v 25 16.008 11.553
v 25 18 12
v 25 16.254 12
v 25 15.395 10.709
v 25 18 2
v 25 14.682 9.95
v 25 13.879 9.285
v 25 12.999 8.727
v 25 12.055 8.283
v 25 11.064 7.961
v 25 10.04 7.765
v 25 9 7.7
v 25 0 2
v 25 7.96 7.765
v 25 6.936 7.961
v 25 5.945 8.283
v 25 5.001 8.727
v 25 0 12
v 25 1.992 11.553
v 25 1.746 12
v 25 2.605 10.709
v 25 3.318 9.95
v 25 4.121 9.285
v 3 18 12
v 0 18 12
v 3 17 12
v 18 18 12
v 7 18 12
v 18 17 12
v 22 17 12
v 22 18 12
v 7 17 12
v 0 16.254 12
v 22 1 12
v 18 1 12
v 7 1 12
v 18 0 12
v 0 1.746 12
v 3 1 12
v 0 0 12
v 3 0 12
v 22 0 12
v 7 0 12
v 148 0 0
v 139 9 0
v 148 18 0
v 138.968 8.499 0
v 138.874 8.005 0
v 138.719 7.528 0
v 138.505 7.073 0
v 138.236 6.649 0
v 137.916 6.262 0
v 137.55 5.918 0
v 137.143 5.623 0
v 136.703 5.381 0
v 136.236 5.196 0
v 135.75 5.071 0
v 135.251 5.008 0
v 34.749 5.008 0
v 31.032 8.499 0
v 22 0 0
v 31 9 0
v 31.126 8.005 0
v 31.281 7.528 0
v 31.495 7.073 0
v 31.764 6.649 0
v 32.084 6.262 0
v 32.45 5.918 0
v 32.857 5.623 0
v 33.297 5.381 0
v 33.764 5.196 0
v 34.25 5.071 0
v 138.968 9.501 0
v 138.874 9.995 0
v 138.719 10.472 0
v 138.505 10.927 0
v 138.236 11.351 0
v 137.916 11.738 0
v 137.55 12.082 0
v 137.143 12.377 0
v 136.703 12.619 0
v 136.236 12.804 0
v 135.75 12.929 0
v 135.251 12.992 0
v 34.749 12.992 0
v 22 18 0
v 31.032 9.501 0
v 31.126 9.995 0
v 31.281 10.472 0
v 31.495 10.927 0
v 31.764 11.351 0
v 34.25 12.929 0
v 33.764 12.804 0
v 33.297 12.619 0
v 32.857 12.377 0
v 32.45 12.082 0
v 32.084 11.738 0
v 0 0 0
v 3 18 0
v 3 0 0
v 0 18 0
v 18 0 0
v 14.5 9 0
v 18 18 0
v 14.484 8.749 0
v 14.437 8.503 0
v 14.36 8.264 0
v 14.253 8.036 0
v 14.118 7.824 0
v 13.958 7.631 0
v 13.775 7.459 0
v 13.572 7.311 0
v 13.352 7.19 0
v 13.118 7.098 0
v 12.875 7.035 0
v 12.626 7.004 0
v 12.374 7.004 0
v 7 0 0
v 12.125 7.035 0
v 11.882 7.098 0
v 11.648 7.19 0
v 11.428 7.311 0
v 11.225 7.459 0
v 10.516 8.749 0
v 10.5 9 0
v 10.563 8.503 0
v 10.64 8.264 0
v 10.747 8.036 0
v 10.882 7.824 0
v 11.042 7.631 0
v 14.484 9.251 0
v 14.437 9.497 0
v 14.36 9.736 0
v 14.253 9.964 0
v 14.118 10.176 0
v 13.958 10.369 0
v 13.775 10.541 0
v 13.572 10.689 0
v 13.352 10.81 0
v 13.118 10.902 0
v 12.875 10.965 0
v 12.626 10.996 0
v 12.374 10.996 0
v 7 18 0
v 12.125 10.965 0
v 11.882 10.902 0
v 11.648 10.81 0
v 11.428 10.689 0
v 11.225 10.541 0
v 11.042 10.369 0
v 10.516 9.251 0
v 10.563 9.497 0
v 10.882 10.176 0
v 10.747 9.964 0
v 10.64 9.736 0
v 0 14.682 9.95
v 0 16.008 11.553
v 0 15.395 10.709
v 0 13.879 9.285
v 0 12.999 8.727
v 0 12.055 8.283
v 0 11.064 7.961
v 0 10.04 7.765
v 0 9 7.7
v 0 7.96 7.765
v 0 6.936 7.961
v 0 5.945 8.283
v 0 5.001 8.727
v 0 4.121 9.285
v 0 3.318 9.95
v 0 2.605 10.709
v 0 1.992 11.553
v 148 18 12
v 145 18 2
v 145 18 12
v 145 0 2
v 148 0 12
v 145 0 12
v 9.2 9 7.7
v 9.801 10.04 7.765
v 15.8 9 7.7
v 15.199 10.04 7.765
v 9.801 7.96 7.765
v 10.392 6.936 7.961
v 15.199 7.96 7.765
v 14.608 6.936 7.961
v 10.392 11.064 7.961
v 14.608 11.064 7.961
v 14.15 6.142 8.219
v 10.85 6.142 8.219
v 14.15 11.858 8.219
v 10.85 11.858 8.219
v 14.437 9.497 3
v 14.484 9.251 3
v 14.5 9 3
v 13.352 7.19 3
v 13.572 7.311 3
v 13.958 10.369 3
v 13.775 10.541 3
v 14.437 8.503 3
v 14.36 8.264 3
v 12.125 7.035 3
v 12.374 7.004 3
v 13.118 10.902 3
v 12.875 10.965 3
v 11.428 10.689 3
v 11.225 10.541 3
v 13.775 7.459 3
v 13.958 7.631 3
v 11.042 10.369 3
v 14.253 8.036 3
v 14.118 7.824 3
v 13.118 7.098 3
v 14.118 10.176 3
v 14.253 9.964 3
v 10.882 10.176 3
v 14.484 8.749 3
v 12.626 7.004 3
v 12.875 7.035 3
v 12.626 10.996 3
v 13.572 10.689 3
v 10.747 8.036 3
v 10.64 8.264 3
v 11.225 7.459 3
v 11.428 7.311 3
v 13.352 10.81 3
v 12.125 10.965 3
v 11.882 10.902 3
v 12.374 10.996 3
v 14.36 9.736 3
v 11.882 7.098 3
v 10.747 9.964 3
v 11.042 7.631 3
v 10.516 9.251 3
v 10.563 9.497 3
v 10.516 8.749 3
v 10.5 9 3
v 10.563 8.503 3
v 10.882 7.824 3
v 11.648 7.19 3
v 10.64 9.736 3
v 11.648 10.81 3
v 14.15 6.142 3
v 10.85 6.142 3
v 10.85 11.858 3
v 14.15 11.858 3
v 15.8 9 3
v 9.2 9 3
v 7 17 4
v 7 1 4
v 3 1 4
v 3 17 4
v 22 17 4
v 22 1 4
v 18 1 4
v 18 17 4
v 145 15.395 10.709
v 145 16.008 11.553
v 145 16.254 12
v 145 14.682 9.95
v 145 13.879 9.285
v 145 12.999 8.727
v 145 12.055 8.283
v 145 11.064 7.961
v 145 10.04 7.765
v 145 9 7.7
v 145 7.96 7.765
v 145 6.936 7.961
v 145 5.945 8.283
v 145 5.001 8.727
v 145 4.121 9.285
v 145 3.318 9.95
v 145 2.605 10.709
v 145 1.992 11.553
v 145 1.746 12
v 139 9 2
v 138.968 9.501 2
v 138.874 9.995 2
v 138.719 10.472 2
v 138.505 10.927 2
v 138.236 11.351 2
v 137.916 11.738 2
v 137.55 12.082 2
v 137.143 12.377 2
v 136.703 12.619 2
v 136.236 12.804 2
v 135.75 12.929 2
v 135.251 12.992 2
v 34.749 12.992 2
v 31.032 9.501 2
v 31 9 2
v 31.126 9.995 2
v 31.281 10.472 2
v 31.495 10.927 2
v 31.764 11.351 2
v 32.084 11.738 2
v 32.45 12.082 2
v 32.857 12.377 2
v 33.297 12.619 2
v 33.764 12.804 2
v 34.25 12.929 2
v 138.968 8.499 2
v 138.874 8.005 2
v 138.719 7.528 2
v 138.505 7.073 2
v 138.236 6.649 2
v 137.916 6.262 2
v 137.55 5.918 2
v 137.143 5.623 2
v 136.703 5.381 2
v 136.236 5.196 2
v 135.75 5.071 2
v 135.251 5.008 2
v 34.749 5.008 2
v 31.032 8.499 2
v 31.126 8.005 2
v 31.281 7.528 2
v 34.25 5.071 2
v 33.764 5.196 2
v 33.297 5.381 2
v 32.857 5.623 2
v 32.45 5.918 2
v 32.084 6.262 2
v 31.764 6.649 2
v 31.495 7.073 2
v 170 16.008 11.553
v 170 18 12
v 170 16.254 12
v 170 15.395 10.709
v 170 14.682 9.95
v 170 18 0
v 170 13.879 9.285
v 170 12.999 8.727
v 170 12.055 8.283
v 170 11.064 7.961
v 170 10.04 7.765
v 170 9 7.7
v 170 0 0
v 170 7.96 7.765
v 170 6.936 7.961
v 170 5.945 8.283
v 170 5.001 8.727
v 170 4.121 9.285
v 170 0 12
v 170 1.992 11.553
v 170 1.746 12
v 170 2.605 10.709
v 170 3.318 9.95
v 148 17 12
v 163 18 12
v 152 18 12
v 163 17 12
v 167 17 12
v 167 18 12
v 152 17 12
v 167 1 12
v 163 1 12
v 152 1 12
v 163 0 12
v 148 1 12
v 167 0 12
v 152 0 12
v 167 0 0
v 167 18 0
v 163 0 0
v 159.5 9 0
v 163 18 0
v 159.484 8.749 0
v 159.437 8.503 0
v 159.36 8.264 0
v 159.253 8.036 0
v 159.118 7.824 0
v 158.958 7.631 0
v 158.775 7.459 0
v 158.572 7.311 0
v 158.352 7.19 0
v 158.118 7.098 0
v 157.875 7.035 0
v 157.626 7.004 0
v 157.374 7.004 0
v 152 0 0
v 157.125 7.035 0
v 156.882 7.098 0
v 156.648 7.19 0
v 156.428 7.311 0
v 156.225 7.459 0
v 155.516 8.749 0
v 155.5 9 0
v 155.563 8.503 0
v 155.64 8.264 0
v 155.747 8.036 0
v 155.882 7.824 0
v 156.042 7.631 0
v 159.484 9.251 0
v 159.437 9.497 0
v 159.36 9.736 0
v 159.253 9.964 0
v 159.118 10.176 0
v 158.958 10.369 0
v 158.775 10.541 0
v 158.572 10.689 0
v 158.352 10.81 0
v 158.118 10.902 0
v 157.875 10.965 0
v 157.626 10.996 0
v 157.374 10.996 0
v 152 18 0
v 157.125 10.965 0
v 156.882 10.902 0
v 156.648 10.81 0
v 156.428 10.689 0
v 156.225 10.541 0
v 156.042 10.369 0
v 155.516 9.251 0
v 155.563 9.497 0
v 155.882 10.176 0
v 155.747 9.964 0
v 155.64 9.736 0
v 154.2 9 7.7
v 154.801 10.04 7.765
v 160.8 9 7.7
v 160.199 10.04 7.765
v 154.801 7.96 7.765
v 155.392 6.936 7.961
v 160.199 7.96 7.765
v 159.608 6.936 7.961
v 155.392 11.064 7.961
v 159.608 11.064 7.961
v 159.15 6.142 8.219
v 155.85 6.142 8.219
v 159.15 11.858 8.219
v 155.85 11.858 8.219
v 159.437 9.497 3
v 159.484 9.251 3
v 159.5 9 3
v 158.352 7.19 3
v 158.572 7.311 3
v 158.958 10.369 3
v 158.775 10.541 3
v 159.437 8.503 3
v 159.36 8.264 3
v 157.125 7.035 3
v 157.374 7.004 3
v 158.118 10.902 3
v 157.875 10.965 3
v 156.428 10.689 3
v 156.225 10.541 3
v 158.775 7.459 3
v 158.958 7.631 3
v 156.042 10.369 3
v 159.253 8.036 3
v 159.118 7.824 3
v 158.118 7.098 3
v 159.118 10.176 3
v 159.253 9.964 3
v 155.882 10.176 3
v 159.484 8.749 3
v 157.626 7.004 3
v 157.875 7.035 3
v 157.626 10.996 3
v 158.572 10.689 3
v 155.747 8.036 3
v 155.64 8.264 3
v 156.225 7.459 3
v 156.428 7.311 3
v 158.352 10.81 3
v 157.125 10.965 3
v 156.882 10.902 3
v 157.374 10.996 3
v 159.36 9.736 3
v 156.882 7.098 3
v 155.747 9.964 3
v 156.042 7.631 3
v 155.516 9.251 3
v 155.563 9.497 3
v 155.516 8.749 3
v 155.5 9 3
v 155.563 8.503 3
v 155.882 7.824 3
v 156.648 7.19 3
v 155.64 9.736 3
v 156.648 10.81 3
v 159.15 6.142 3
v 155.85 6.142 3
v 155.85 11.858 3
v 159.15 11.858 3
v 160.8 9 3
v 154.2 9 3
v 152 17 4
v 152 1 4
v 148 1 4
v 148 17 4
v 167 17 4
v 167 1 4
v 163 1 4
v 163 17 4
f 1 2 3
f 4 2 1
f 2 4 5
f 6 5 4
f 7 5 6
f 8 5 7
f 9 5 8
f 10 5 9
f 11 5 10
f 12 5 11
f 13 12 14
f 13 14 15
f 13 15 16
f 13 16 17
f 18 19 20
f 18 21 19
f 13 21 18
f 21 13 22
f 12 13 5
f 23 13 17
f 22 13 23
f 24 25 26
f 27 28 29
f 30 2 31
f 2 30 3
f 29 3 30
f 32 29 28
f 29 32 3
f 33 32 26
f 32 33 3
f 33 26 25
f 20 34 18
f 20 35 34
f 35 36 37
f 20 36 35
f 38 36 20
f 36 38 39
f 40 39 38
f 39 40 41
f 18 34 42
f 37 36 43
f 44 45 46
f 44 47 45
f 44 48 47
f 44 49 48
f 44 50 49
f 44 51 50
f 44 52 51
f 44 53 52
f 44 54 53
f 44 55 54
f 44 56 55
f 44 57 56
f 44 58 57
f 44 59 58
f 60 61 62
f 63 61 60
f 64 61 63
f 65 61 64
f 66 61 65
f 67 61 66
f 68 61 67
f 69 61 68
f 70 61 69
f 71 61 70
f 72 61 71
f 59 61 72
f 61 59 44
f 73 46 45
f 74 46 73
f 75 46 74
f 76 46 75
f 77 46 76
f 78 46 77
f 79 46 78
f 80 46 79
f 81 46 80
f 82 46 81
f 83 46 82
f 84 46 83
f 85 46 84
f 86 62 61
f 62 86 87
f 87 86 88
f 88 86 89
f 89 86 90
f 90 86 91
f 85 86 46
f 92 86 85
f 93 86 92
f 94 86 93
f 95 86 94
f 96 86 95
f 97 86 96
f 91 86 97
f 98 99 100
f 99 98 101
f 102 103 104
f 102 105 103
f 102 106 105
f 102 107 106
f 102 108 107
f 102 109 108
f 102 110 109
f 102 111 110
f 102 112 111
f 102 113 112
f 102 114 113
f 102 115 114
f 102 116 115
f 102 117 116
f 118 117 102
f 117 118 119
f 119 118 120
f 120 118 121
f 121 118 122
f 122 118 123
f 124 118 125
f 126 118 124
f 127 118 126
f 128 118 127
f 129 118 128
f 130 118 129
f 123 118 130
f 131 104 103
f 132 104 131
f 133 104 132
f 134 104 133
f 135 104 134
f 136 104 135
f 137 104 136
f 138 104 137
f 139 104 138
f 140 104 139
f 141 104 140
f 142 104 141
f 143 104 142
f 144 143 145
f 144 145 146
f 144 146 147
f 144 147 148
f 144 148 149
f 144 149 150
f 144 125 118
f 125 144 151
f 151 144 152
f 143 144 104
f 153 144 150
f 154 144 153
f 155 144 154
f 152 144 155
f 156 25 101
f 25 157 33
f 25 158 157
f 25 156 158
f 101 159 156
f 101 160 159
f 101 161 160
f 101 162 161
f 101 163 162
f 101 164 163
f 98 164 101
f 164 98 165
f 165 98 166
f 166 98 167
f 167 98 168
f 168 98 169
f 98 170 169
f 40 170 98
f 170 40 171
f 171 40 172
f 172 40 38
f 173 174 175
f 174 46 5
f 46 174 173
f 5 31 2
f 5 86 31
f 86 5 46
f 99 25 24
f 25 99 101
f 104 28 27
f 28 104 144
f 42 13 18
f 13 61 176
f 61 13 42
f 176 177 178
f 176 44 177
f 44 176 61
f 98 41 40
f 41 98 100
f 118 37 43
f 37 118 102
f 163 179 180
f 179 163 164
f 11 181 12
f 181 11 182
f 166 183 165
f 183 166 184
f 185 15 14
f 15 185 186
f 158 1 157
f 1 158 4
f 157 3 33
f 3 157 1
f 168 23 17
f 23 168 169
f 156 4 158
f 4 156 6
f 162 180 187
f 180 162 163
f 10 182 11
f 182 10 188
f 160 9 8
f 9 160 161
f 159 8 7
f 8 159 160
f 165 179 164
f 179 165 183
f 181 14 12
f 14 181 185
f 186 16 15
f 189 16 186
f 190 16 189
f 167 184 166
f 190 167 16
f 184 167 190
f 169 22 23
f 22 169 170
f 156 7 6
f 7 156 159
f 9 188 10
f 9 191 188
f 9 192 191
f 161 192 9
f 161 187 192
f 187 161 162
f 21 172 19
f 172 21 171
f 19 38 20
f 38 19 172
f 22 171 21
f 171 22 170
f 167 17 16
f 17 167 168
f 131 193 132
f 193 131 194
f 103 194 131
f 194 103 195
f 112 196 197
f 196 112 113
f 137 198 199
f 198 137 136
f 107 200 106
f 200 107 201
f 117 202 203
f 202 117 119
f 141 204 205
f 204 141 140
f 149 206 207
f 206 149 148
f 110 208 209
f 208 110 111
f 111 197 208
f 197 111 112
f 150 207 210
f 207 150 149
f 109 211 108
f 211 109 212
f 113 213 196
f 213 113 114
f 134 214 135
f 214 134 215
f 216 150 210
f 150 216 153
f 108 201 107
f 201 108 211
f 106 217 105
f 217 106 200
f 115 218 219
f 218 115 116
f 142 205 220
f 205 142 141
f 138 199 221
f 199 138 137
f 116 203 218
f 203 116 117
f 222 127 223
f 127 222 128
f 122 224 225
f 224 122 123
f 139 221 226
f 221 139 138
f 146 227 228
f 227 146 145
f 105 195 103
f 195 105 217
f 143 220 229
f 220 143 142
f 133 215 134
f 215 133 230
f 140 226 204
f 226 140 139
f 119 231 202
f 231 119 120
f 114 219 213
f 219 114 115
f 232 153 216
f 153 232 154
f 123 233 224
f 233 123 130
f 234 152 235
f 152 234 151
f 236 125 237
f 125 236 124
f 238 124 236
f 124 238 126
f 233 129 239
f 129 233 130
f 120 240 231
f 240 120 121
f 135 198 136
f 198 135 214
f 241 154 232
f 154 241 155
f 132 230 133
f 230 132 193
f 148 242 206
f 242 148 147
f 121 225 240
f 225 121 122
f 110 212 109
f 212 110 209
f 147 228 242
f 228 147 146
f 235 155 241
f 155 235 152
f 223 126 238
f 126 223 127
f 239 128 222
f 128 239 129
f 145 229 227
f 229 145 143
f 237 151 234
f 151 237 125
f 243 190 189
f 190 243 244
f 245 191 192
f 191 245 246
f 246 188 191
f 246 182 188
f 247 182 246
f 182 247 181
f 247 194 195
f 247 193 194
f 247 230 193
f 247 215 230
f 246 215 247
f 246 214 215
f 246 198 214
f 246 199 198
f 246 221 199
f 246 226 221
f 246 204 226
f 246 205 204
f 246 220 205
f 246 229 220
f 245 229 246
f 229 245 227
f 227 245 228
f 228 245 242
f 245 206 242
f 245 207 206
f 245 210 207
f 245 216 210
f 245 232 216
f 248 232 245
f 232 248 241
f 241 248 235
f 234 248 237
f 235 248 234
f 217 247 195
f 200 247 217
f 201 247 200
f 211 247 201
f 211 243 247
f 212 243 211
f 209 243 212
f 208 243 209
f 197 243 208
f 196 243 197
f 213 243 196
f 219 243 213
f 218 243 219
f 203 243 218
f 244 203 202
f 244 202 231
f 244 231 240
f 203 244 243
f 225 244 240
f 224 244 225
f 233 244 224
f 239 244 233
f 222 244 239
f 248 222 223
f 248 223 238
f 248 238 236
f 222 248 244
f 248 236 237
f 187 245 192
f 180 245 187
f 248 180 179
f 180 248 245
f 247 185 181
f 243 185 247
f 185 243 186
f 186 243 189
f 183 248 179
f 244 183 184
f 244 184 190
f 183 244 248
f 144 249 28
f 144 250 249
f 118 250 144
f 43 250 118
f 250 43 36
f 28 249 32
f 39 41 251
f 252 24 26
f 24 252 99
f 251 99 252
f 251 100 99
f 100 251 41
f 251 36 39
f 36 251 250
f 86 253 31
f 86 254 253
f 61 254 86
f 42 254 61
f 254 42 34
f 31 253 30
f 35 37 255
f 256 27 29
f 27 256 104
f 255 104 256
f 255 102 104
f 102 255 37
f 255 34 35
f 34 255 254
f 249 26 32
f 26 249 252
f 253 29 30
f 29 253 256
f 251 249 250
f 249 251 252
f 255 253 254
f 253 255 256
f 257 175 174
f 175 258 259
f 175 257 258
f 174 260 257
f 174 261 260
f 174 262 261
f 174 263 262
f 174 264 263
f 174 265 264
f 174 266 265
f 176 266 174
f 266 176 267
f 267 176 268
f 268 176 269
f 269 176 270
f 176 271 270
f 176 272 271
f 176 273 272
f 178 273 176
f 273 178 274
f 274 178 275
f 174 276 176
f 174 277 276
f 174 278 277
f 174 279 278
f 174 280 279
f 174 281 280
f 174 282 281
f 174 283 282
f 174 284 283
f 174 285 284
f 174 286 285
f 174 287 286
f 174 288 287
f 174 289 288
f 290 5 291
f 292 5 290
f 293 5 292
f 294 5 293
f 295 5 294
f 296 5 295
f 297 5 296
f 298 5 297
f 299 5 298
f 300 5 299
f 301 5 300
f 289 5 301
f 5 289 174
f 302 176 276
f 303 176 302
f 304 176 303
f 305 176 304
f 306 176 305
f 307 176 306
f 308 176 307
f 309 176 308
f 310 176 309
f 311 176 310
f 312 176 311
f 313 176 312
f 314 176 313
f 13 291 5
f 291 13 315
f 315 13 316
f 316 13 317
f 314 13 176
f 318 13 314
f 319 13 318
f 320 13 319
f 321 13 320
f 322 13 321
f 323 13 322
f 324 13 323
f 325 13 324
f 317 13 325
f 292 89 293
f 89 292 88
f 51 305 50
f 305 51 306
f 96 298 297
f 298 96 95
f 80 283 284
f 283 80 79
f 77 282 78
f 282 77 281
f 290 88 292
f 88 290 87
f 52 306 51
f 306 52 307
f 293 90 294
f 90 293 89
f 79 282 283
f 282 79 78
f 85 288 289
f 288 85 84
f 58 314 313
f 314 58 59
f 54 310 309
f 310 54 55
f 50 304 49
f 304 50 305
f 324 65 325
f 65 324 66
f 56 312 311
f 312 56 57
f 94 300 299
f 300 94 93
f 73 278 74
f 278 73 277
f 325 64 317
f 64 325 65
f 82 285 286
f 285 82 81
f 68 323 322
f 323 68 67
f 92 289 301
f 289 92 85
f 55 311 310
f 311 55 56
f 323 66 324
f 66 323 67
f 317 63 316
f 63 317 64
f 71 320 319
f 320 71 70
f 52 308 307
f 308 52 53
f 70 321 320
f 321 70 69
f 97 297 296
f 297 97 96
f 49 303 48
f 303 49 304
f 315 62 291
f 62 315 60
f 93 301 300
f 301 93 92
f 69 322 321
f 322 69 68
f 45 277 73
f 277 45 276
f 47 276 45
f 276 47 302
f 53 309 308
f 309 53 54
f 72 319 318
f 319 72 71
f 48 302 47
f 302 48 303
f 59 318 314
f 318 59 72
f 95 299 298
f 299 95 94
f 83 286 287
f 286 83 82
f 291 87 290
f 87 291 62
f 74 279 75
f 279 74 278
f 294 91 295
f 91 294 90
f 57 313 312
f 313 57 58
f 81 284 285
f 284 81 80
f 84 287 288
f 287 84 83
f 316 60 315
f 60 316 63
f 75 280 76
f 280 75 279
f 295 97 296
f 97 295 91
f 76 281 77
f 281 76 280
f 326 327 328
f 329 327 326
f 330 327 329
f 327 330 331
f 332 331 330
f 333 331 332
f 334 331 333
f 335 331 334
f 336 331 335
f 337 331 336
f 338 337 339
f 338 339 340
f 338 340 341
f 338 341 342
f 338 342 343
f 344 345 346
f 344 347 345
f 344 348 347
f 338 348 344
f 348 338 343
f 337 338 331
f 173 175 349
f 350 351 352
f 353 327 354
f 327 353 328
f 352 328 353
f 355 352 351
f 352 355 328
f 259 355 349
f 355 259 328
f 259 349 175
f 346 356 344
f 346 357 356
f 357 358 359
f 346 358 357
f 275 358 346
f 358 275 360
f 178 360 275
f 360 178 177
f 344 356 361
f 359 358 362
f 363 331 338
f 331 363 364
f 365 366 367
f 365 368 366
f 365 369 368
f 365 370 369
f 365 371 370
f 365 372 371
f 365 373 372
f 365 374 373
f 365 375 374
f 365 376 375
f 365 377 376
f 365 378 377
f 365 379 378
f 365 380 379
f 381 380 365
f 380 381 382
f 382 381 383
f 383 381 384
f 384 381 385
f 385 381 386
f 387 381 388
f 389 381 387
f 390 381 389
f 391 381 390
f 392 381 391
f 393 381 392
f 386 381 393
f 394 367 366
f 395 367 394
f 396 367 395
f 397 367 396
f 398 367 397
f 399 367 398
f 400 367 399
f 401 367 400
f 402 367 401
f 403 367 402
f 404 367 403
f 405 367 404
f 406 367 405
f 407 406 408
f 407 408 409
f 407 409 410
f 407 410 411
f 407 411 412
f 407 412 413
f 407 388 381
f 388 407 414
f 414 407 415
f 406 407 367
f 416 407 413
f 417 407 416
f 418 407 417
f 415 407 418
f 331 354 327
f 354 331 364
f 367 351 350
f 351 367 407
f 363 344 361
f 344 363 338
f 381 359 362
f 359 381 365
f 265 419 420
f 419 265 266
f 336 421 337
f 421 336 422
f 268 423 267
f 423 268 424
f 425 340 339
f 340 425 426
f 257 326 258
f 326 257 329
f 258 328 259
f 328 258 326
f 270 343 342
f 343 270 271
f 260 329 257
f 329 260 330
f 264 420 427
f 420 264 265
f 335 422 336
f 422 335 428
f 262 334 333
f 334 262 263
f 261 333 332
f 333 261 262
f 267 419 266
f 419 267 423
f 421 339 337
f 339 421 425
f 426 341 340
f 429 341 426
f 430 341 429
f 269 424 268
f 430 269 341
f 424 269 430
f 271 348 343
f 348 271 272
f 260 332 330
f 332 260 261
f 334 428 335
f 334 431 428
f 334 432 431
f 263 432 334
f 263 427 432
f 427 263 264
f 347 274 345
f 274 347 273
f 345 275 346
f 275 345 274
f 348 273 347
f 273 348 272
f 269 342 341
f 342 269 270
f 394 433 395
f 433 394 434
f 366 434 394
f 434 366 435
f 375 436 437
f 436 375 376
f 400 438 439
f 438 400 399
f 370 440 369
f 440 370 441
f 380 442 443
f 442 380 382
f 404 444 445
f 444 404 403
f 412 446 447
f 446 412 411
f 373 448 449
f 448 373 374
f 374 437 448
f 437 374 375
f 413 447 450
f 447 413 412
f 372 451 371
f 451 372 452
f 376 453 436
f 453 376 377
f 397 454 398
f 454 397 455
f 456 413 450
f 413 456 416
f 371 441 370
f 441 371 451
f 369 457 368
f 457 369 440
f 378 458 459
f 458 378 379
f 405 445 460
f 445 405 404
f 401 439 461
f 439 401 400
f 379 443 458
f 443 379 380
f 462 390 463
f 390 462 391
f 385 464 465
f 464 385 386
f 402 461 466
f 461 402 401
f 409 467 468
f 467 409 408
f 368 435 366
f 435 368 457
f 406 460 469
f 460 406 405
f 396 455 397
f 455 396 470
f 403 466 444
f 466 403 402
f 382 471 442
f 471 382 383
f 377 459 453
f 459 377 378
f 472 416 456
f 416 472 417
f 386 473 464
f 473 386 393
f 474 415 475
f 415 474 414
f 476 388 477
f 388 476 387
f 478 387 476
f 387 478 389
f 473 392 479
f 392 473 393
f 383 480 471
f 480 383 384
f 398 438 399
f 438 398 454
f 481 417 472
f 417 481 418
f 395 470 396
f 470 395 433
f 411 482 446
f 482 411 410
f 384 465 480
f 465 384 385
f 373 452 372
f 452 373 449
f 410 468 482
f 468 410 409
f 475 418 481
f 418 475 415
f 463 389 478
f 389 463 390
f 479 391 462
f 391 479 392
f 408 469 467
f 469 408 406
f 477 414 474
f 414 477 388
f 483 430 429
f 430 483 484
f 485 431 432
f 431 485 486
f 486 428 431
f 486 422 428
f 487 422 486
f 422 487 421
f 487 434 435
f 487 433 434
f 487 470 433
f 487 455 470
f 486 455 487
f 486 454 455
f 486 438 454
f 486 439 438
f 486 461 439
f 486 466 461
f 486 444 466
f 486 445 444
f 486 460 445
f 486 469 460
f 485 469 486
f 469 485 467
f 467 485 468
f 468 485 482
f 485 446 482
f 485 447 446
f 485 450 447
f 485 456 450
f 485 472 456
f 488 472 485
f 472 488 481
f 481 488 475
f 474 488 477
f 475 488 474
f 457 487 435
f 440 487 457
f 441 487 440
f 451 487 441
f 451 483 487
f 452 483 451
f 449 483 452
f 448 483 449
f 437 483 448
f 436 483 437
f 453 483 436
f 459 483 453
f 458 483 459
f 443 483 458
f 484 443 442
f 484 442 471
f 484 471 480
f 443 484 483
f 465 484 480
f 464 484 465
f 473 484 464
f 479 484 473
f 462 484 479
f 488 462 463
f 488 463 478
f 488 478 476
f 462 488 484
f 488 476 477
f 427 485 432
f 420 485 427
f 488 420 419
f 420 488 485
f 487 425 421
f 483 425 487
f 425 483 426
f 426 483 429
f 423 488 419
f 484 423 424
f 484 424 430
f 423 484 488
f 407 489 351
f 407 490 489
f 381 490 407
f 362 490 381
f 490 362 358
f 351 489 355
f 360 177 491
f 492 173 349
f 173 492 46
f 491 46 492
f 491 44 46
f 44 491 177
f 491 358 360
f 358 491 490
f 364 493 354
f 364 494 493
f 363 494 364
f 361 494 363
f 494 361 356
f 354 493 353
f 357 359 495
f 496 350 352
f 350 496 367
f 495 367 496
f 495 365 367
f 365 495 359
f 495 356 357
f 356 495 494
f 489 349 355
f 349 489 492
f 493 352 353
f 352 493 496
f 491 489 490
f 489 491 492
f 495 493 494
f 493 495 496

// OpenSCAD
ep=2;
r_douille=8.3;
largeur=18;
h1=12;
h2=16;
l_fixe=25;
l_flottant=31;
trou_m3=2;
ecrou_m3=3.3;
pass_collier=4;
ep_collier=1;
entraxe=145;

module support_douille_fixe(){
	difference(){
		cube([l_fixe,largeur,h1]);

		//trou pour douille
		translate([-5,largeur/2,h2]){rotate([0,90,0])cylinder(h=l_fixe+10, r=r_douille, $fn=50);}

		//trous pour écrou de fixation
		translate([l_fixe/2,largeur/2,-5]){cylinder(h=h2+10, r=trou_m3, $fn=50);}
		translate([l_fixe/2,largeur/2,3]){cylinder(h=h2+10, r=ecrou_m3, $fn=6);}

		//creux pour passage collier
		translate([3,-2,-5]){cube([pass_collier,ep_collier+2,h2+10]);}
		translate([18,-2,-5]){cube([pass_collier,ep_collier+2,h2+10]);}
		translate([3,largeur-ep_collier,-5]){cube([pass_collier,ep_collier+2,h2+10]);}
		translate([18,largeur-ep_collier,-5]){cube([pass_collier,ep_collier+2,h2+10]);}
		translate([3,-5,-2]){cube([pass_collier,largeur+10,pass_collier+2]);}
		translate([18,-5,-2]){cube([pass_collier,largeur+10,pass_collier+2]);}
		
	}
}

module support_douille_flottant(){
}

module lamelle_assemblage(){
	difference(){
		cube([entraxe-l_fixe/2-l_fixe/2,largeur,ep]);
		hull(){
			translate([10,largeur/2,-5]){cylinder(h=h2, r=4, $fn=50);}
			translate([(entraxe-l_fixe/2-l_fixe/2)-10,largeur/2,-5]){cylinder(h=h2, r=4, $fn=50);}
		}
	}
}

support_douille_fixe();
translate([l_fixe,0,0]){lamelle_assemblage();}
translate([l_fixe/2+entraxe-l_fixe/2,0,0]){support_douille_fixe();;}
